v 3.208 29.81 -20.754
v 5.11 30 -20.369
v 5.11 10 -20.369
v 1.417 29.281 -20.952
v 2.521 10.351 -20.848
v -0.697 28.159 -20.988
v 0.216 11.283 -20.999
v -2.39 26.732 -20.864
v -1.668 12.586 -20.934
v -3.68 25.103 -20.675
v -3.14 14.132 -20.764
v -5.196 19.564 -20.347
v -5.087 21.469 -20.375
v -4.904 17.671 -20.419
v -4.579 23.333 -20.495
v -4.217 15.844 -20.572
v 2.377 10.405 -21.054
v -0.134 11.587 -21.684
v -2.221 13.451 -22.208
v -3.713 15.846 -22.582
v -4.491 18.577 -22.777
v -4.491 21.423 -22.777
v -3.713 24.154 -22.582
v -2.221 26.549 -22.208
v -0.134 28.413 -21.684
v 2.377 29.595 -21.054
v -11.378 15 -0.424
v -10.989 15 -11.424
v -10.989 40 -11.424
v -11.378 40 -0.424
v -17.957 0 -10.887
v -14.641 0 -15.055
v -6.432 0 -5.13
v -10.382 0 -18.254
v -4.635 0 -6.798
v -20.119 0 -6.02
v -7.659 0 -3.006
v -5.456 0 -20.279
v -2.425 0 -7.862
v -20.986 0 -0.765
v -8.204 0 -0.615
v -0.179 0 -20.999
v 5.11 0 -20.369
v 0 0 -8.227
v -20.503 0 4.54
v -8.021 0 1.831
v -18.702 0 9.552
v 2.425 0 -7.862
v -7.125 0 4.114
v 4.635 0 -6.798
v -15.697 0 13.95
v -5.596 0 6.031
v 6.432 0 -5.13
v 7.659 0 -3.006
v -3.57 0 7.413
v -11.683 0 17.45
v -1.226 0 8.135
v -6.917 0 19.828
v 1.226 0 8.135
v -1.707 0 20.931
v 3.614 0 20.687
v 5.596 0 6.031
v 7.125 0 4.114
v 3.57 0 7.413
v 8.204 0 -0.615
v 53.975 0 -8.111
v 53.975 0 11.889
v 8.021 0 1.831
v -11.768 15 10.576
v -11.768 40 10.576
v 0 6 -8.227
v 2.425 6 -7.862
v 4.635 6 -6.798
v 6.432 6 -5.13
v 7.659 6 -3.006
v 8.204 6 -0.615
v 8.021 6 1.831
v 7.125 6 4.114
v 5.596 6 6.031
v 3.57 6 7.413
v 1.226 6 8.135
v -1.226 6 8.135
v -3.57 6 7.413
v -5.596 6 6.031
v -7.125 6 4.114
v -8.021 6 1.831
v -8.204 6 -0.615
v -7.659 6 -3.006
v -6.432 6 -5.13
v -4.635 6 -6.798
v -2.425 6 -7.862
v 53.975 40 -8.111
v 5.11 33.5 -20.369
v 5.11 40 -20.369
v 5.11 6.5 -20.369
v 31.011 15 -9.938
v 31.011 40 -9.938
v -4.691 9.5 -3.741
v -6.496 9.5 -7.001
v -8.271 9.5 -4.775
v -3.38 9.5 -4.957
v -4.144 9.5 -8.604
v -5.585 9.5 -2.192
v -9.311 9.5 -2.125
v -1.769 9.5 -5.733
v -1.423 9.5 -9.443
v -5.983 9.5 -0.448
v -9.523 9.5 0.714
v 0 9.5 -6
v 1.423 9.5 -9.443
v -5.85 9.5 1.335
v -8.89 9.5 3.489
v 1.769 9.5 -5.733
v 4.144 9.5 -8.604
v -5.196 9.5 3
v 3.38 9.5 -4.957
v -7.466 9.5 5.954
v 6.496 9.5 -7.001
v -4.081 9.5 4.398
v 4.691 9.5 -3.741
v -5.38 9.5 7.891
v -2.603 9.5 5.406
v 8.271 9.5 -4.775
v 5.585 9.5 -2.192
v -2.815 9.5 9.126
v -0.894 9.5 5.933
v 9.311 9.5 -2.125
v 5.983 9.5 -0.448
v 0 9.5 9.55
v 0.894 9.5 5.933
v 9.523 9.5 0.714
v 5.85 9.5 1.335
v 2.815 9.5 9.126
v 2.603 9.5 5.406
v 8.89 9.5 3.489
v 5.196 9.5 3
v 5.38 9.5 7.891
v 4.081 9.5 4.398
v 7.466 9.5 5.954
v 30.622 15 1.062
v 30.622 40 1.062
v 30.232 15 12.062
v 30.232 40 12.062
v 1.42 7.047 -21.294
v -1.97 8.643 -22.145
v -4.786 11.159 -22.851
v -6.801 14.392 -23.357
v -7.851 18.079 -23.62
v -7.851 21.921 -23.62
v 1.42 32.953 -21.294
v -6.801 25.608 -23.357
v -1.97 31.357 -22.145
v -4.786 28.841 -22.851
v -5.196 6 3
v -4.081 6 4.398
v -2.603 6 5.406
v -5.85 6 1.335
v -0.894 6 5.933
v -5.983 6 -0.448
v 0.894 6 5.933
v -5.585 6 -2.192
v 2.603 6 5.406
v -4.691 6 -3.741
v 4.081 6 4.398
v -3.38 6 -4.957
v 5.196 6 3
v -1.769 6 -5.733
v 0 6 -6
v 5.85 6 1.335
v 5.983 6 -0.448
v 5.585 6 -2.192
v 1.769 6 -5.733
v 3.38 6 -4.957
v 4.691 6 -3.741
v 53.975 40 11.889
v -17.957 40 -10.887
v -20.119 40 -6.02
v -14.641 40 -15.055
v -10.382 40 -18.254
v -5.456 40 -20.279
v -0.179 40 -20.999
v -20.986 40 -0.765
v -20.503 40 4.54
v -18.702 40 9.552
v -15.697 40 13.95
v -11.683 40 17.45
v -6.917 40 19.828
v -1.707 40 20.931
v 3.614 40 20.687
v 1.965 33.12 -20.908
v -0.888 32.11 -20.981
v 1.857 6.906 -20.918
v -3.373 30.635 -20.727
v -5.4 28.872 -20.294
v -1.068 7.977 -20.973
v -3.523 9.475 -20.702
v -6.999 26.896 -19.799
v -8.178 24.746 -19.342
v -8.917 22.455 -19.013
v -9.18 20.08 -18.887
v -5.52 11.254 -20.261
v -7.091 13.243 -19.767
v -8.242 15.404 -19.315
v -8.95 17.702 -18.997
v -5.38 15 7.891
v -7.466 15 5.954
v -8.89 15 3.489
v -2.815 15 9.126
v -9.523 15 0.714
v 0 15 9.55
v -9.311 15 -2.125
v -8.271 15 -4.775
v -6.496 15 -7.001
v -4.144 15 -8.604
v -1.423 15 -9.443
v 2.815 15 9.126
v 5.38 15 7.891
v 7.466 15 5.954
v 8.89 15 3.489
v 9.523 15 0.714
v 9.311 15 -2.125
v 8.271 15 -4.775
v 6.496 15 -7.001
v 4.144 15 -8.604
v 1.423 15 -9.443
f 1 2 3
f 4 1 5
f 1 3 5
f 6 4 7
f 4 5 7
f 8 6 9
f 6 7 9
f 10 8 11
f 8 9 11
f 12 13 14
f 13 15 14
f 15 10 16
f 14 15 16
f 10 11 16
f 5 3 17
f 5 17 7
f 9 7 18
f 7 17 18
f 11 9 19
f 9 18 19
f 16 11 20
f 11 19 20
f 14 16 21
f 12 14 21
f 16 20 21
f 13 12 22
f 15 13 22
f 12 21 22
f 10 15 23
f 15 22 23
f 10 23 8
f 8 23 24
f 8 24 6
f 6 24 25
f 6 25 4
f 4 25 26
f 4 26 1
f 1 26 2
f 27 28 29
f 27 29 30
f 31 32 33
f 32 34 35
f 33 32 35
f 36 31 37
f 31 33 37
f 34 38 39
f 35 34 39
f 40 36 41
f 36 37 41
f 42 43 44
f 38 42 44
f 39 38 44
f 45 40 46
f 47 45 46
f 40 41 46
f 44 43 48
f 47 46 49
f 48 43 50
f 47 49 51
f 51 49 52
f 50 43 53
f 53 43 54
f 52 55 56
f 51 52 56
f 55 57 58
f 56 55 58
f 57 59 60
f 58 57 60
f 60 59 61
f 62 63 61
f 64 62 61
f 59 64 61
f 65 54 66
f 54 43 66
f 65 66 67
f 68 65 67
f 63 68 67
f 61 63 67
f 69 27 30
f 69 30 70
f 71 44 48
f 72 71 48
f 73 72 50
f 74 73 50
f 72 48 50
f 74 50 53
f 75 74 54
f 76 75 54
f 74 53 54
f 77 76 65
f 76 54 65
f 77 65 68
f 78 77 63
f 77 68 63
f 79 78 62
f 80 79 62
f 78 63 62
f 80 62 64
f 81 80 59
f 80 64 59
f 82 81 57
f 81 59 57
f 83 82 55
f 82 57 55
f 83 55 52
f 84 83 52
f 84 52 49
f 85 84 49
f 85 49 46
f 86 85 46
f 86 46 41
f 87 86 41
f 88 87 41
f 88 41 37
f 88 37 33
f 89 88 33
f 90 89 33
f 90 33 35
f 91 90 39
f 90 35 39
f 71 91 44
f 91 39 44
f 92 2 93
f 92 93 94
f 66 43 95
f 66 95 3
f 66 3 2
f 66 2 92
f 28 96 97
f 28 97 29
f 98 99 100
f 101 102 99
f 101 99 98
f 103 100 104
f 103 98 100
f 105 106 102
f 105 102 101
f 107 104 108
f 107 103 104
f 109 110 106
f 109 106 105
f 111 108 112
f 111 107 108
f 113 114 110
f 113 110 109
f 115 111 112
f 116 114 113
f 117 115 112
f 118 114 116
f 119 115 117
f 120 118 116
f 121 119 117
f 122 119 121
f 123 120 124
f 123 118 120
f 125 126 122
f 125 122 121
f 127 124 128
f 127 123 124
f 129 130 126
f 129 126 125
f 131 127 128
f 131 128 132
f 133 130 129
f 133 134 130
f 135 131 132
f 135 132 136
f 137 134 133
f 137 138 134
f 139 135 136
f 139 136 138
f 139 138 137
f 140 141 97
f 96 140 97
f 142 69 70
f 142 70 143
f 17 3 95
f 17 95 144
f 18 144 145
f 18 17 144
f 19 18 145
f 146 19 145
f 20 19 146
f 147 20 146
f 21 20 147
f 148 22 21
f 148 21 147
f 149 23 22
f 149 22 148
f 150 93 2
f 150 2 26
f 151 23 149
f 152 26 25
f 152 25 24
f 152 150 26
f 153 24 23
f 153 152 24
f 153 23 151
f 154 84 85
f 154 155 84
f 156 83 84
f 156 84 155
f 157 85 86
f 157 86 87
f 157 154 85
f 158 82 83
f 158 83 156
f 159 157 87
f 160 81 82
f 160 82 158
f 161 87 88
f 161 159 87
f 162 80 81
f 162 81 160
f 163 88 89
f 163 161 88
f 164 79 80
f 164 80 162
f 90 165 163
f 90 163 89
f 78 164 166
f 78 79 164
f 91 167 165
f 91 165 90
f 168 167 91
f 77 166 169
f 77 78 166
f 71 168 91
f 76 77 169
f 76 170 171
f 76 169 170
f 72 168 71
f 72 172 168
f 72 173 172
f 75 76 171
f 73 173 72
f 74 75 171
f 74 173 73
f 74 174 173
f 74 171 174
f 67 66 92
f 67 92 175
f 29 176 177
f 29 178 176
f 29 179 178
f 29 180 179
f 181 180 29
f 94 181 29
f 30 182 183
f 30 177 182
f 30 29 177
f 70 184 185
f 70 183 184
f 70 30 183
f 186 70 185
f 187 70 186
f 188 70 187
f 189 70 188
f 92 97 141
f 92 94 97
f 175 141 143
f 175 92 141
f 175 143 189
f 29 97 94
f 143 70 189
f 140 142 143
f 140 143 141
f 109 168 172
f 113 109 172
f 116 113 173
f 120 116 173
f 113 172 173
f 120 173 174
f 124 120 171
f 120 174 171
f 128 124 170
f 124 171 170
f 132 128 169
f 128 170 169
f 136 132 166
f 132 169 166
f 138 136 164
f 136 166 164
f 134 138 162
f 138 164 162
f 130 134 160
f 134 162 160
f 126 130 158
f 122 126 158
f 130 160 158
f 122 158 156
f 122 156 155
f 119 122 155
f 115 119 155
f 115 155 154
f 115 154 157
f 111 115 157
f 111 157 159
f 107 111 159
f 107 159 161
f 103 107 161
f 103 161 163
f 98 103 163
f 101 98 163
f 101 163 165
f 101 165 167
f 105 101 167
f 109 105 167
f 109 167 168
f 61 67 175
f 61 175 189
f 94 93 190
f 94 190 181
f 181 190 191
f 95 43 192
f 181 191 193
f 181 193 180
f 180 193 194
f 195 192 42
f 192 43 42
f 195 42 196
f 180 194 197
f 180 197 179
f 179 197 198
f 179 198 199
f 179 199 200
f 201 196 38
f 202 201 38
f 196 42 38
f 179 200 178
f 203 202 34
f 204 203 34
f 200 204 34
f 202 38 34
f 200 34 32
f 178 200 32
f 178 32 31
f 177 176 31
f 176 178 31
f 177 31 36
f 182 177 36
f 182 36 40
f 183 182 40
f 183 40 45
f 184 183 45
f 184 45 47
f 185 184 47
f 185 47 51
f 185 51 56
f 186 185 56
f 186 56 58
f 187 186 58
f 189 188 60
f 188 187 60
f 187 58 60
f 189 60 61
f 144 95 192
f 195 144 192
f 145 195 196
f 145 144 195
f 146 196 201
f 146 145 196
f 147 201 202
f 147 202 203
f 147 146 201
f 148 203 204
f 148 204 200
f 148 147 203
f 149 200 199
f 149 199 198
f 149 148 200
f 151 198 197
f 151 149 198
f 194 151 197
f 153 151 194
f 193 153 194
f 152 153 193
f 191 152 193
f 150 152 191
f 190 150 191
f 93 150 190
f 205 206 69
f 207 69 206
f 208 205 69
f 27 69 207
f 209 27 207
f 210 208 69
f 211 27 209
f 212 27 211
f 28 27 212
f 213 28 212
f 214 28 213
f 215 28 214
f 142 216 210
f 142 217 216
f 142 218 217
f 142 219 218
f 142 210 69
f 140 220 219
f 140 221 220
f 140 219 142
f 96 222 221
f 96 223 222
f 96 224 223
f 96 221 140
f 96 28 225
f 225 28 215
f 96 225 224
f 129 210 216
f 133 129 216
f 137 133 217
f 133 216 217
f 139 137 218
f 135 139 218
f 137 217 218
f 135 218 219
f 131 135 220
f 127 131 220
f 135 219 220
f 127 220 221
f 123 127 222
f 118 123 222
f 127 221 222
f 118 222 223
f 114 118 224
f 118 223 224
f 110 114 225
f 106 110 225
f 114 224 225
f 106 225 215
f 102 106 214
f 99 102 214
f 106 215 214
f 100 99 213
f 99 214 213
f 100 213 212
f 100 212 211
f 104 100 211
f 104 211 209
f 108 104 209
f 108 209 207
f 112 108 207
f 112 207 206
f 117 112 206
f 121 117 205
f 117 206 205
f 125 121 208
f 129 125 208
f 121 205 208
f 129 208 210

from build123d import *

# Parameters (mm, degrees)
CROQUIS1_R              = 21
SALIENTE_EXTRUIR1_DEPTH = 40
SALIENTE_EXTRUIR2_DEPTH = 40
SALIENTE_EXTRUIR3_REACH = 77.493
CROQUIS3_R              = 13.5
CROQUIS3_R_2            = 10
CROQUIS7_R              = 8.227269221
CROQUIS7_R_2            = 6
CORTAR_EXTRUIR6_DEPTH   = 6
CROQUIS8_R              = 6
CORTAR_EXTRUIR7_DEPTH   = 72.223648425
CORTAR_EXTRUIR8_START   = -25
CORTAR_EXTRUIR8_DEPTH   = 25
CROQUIS12_R             = 9.55
CORTAR_EXTRUIR9_DEPTH   = 5.5


with BuildPart() as part:
    # Croquis1 → Saliente-Extruir1 (new body)
    with BuildSketch(Plane(origin=(0, 0, 0), x_dir=(1, 0, 0), z_dir=(0, 1, 0))):
        with Locations(Location((0, 0, 0), (0, 0, 270))):
            Circle(CROQUIS1_R)
    extrude(amount=SALIENTE_EXTRUIR1_DEPTH)

    # Croquis2 → Saliente-Extruir2 (add)
    with BuildSketch(Plane(origin=(0, 0, 0), x_dir=(1, 0, 0), z_dir=(0, 1, 0))):
        with BuildLine():
            Line((53.975127576, 8.110971331), (53.975127576, -11.889028669))
            Line((53.975127576, -11.889028669), (3.613793412, -20.686722727))
            ThreePointArc((3.613793412, -20.686722727), (20.98607707, -0.764571273), (5.109545014, 20.368911354))
            Line((5.109545014, 20.368911354), (53.975127576, 8.110971331))
        make_face()
    extrude(amount=SALIENTE_EXTRUIR2_DEPTH)

    # Croquis3 → Saliente-Extruir3 (add, up to next)
    with BuildSketch(Plane(origin=(5.109545014, 0, -20.368911354), x_dir=(-0.9699481597219111, 0, -0.24331166731597212), z_dir=(0.2433116673159721, 0, -0.969948159721911)), mode=Mode.PRIVATE) as saliente_extruir3_sk1:
        with Locations((0, 20)):
            Circle(CROQUIS3_R)
        with Locations((0, 20)):
            Circle(CROQUIS3_R_2, mode=Mode.SUBTRACT)
    saliente_extruir3_tool1 = extrude(saliente_extruir3_sk1.sketch, amount=-SALIENTE_EXTRUIR3_REACH, mode=Mode.PRIVATE) - part.part
    add(saliente_extruir3_tool1.solids().sort_by_distance((17.833482, 20, -17.177109))[0])

    # Croquis7 → Cortar-Extruir6 (cut)
    with BuildSketch(Plane.XZ):
        with Locations(Location((0, 0, 0), (0, 0, 270))):
            Circle(CROQUIS7_R)
        with Locations(Location((0, 0, 0), (0, 0, 270))):
            Circle(CROQUIS7_R_2, mode=Mode.SUBTRACT)
    extrude(amount=-CORTAR_EXTRUIR6_DEPTH, mode=Mode.SUBTRACT)

    # Croquis8 → Cortar-Extruir7 (cut, through all)
    with BuildSketch(Plane.XZ):
        with Locations(Location((0, 0, 0), (0, 0, 270))):
            Circle(CROQUIS8_R)
    extrude(amount=-CORTAR_EXTRUIR7_DEPTH, mode=Mode.SUBTRACT)

    # Croquis10 → Cortar-Extruir8 (cut)
    with BuildSketch(Plane(origin=(0, 40, 0), x_dir=(1, 0, 0), z_dir=(0, 1, 0)).offset(CORTAR_EXTRUIR8_START)):
        with BuildLine():
            Line((-5.995438853, 0.23390802), (-11.37823559, 0.424457107))
            Line((-11.37823559, 0.424457107), (-11.767631672, -10.575542893))
            Line((-11.767631672, -10.575542893), (30.232368328, -12.062327932))
            Line((30.232368328, -12.062327932), (30.62176441, -1.062327932))
            Line((30.62176441, -1.062327932), (5.996971268, -0.190619027))
            ThreePointArc((5.996971268, -0.190619027), (-0.212264906, -5.996244125), (-5.995438853, 0.23390802))
        make_face()
        with BuildLine():
            Line((-10.988839509, 11.424457107), (-11.37823559, 0.424457107))
            Line((-11.37823559, 0.424457107), (-5.995438853, 0.23390802))
            ThreePointArc((-5.995438853, 0.23390802), (0.116976243, 5.998859605), (6, 0))
            ThreePointArc((6, 0), (5.999242769, -0.095321543), (5.996971268, -0.190619027))
            Line((5.996971268, -0.190619027), (30.62176441, -1.062327932))
            Line((30.62176441, -1.062327932), (31.011160491, 9.937672068))
            Line((31.011160491, 9.937672068), (-10.988839509, 11.424457107))
        make_face()
    extrude(amount=CORTAR_EXTRUIR8_DEPTH, mode=Mode.SUBTRACT)

    # Croquis12 → Cortar-Extruir9 (cut)
    with BuildSketch(Plane(origin=(0, 15, 0), x_dir=(1, 0, 0), z_dir=(0, 1, 0))):
        with Locations(Location((0, 0, 0), (0, 0, 270))):
            Circle(CROQUIS12_R)
    extrude(amount=-CORTAR_EXTRUIR9_DEPTH, mode=Mode.SUBTRACT)


solid = part.part
